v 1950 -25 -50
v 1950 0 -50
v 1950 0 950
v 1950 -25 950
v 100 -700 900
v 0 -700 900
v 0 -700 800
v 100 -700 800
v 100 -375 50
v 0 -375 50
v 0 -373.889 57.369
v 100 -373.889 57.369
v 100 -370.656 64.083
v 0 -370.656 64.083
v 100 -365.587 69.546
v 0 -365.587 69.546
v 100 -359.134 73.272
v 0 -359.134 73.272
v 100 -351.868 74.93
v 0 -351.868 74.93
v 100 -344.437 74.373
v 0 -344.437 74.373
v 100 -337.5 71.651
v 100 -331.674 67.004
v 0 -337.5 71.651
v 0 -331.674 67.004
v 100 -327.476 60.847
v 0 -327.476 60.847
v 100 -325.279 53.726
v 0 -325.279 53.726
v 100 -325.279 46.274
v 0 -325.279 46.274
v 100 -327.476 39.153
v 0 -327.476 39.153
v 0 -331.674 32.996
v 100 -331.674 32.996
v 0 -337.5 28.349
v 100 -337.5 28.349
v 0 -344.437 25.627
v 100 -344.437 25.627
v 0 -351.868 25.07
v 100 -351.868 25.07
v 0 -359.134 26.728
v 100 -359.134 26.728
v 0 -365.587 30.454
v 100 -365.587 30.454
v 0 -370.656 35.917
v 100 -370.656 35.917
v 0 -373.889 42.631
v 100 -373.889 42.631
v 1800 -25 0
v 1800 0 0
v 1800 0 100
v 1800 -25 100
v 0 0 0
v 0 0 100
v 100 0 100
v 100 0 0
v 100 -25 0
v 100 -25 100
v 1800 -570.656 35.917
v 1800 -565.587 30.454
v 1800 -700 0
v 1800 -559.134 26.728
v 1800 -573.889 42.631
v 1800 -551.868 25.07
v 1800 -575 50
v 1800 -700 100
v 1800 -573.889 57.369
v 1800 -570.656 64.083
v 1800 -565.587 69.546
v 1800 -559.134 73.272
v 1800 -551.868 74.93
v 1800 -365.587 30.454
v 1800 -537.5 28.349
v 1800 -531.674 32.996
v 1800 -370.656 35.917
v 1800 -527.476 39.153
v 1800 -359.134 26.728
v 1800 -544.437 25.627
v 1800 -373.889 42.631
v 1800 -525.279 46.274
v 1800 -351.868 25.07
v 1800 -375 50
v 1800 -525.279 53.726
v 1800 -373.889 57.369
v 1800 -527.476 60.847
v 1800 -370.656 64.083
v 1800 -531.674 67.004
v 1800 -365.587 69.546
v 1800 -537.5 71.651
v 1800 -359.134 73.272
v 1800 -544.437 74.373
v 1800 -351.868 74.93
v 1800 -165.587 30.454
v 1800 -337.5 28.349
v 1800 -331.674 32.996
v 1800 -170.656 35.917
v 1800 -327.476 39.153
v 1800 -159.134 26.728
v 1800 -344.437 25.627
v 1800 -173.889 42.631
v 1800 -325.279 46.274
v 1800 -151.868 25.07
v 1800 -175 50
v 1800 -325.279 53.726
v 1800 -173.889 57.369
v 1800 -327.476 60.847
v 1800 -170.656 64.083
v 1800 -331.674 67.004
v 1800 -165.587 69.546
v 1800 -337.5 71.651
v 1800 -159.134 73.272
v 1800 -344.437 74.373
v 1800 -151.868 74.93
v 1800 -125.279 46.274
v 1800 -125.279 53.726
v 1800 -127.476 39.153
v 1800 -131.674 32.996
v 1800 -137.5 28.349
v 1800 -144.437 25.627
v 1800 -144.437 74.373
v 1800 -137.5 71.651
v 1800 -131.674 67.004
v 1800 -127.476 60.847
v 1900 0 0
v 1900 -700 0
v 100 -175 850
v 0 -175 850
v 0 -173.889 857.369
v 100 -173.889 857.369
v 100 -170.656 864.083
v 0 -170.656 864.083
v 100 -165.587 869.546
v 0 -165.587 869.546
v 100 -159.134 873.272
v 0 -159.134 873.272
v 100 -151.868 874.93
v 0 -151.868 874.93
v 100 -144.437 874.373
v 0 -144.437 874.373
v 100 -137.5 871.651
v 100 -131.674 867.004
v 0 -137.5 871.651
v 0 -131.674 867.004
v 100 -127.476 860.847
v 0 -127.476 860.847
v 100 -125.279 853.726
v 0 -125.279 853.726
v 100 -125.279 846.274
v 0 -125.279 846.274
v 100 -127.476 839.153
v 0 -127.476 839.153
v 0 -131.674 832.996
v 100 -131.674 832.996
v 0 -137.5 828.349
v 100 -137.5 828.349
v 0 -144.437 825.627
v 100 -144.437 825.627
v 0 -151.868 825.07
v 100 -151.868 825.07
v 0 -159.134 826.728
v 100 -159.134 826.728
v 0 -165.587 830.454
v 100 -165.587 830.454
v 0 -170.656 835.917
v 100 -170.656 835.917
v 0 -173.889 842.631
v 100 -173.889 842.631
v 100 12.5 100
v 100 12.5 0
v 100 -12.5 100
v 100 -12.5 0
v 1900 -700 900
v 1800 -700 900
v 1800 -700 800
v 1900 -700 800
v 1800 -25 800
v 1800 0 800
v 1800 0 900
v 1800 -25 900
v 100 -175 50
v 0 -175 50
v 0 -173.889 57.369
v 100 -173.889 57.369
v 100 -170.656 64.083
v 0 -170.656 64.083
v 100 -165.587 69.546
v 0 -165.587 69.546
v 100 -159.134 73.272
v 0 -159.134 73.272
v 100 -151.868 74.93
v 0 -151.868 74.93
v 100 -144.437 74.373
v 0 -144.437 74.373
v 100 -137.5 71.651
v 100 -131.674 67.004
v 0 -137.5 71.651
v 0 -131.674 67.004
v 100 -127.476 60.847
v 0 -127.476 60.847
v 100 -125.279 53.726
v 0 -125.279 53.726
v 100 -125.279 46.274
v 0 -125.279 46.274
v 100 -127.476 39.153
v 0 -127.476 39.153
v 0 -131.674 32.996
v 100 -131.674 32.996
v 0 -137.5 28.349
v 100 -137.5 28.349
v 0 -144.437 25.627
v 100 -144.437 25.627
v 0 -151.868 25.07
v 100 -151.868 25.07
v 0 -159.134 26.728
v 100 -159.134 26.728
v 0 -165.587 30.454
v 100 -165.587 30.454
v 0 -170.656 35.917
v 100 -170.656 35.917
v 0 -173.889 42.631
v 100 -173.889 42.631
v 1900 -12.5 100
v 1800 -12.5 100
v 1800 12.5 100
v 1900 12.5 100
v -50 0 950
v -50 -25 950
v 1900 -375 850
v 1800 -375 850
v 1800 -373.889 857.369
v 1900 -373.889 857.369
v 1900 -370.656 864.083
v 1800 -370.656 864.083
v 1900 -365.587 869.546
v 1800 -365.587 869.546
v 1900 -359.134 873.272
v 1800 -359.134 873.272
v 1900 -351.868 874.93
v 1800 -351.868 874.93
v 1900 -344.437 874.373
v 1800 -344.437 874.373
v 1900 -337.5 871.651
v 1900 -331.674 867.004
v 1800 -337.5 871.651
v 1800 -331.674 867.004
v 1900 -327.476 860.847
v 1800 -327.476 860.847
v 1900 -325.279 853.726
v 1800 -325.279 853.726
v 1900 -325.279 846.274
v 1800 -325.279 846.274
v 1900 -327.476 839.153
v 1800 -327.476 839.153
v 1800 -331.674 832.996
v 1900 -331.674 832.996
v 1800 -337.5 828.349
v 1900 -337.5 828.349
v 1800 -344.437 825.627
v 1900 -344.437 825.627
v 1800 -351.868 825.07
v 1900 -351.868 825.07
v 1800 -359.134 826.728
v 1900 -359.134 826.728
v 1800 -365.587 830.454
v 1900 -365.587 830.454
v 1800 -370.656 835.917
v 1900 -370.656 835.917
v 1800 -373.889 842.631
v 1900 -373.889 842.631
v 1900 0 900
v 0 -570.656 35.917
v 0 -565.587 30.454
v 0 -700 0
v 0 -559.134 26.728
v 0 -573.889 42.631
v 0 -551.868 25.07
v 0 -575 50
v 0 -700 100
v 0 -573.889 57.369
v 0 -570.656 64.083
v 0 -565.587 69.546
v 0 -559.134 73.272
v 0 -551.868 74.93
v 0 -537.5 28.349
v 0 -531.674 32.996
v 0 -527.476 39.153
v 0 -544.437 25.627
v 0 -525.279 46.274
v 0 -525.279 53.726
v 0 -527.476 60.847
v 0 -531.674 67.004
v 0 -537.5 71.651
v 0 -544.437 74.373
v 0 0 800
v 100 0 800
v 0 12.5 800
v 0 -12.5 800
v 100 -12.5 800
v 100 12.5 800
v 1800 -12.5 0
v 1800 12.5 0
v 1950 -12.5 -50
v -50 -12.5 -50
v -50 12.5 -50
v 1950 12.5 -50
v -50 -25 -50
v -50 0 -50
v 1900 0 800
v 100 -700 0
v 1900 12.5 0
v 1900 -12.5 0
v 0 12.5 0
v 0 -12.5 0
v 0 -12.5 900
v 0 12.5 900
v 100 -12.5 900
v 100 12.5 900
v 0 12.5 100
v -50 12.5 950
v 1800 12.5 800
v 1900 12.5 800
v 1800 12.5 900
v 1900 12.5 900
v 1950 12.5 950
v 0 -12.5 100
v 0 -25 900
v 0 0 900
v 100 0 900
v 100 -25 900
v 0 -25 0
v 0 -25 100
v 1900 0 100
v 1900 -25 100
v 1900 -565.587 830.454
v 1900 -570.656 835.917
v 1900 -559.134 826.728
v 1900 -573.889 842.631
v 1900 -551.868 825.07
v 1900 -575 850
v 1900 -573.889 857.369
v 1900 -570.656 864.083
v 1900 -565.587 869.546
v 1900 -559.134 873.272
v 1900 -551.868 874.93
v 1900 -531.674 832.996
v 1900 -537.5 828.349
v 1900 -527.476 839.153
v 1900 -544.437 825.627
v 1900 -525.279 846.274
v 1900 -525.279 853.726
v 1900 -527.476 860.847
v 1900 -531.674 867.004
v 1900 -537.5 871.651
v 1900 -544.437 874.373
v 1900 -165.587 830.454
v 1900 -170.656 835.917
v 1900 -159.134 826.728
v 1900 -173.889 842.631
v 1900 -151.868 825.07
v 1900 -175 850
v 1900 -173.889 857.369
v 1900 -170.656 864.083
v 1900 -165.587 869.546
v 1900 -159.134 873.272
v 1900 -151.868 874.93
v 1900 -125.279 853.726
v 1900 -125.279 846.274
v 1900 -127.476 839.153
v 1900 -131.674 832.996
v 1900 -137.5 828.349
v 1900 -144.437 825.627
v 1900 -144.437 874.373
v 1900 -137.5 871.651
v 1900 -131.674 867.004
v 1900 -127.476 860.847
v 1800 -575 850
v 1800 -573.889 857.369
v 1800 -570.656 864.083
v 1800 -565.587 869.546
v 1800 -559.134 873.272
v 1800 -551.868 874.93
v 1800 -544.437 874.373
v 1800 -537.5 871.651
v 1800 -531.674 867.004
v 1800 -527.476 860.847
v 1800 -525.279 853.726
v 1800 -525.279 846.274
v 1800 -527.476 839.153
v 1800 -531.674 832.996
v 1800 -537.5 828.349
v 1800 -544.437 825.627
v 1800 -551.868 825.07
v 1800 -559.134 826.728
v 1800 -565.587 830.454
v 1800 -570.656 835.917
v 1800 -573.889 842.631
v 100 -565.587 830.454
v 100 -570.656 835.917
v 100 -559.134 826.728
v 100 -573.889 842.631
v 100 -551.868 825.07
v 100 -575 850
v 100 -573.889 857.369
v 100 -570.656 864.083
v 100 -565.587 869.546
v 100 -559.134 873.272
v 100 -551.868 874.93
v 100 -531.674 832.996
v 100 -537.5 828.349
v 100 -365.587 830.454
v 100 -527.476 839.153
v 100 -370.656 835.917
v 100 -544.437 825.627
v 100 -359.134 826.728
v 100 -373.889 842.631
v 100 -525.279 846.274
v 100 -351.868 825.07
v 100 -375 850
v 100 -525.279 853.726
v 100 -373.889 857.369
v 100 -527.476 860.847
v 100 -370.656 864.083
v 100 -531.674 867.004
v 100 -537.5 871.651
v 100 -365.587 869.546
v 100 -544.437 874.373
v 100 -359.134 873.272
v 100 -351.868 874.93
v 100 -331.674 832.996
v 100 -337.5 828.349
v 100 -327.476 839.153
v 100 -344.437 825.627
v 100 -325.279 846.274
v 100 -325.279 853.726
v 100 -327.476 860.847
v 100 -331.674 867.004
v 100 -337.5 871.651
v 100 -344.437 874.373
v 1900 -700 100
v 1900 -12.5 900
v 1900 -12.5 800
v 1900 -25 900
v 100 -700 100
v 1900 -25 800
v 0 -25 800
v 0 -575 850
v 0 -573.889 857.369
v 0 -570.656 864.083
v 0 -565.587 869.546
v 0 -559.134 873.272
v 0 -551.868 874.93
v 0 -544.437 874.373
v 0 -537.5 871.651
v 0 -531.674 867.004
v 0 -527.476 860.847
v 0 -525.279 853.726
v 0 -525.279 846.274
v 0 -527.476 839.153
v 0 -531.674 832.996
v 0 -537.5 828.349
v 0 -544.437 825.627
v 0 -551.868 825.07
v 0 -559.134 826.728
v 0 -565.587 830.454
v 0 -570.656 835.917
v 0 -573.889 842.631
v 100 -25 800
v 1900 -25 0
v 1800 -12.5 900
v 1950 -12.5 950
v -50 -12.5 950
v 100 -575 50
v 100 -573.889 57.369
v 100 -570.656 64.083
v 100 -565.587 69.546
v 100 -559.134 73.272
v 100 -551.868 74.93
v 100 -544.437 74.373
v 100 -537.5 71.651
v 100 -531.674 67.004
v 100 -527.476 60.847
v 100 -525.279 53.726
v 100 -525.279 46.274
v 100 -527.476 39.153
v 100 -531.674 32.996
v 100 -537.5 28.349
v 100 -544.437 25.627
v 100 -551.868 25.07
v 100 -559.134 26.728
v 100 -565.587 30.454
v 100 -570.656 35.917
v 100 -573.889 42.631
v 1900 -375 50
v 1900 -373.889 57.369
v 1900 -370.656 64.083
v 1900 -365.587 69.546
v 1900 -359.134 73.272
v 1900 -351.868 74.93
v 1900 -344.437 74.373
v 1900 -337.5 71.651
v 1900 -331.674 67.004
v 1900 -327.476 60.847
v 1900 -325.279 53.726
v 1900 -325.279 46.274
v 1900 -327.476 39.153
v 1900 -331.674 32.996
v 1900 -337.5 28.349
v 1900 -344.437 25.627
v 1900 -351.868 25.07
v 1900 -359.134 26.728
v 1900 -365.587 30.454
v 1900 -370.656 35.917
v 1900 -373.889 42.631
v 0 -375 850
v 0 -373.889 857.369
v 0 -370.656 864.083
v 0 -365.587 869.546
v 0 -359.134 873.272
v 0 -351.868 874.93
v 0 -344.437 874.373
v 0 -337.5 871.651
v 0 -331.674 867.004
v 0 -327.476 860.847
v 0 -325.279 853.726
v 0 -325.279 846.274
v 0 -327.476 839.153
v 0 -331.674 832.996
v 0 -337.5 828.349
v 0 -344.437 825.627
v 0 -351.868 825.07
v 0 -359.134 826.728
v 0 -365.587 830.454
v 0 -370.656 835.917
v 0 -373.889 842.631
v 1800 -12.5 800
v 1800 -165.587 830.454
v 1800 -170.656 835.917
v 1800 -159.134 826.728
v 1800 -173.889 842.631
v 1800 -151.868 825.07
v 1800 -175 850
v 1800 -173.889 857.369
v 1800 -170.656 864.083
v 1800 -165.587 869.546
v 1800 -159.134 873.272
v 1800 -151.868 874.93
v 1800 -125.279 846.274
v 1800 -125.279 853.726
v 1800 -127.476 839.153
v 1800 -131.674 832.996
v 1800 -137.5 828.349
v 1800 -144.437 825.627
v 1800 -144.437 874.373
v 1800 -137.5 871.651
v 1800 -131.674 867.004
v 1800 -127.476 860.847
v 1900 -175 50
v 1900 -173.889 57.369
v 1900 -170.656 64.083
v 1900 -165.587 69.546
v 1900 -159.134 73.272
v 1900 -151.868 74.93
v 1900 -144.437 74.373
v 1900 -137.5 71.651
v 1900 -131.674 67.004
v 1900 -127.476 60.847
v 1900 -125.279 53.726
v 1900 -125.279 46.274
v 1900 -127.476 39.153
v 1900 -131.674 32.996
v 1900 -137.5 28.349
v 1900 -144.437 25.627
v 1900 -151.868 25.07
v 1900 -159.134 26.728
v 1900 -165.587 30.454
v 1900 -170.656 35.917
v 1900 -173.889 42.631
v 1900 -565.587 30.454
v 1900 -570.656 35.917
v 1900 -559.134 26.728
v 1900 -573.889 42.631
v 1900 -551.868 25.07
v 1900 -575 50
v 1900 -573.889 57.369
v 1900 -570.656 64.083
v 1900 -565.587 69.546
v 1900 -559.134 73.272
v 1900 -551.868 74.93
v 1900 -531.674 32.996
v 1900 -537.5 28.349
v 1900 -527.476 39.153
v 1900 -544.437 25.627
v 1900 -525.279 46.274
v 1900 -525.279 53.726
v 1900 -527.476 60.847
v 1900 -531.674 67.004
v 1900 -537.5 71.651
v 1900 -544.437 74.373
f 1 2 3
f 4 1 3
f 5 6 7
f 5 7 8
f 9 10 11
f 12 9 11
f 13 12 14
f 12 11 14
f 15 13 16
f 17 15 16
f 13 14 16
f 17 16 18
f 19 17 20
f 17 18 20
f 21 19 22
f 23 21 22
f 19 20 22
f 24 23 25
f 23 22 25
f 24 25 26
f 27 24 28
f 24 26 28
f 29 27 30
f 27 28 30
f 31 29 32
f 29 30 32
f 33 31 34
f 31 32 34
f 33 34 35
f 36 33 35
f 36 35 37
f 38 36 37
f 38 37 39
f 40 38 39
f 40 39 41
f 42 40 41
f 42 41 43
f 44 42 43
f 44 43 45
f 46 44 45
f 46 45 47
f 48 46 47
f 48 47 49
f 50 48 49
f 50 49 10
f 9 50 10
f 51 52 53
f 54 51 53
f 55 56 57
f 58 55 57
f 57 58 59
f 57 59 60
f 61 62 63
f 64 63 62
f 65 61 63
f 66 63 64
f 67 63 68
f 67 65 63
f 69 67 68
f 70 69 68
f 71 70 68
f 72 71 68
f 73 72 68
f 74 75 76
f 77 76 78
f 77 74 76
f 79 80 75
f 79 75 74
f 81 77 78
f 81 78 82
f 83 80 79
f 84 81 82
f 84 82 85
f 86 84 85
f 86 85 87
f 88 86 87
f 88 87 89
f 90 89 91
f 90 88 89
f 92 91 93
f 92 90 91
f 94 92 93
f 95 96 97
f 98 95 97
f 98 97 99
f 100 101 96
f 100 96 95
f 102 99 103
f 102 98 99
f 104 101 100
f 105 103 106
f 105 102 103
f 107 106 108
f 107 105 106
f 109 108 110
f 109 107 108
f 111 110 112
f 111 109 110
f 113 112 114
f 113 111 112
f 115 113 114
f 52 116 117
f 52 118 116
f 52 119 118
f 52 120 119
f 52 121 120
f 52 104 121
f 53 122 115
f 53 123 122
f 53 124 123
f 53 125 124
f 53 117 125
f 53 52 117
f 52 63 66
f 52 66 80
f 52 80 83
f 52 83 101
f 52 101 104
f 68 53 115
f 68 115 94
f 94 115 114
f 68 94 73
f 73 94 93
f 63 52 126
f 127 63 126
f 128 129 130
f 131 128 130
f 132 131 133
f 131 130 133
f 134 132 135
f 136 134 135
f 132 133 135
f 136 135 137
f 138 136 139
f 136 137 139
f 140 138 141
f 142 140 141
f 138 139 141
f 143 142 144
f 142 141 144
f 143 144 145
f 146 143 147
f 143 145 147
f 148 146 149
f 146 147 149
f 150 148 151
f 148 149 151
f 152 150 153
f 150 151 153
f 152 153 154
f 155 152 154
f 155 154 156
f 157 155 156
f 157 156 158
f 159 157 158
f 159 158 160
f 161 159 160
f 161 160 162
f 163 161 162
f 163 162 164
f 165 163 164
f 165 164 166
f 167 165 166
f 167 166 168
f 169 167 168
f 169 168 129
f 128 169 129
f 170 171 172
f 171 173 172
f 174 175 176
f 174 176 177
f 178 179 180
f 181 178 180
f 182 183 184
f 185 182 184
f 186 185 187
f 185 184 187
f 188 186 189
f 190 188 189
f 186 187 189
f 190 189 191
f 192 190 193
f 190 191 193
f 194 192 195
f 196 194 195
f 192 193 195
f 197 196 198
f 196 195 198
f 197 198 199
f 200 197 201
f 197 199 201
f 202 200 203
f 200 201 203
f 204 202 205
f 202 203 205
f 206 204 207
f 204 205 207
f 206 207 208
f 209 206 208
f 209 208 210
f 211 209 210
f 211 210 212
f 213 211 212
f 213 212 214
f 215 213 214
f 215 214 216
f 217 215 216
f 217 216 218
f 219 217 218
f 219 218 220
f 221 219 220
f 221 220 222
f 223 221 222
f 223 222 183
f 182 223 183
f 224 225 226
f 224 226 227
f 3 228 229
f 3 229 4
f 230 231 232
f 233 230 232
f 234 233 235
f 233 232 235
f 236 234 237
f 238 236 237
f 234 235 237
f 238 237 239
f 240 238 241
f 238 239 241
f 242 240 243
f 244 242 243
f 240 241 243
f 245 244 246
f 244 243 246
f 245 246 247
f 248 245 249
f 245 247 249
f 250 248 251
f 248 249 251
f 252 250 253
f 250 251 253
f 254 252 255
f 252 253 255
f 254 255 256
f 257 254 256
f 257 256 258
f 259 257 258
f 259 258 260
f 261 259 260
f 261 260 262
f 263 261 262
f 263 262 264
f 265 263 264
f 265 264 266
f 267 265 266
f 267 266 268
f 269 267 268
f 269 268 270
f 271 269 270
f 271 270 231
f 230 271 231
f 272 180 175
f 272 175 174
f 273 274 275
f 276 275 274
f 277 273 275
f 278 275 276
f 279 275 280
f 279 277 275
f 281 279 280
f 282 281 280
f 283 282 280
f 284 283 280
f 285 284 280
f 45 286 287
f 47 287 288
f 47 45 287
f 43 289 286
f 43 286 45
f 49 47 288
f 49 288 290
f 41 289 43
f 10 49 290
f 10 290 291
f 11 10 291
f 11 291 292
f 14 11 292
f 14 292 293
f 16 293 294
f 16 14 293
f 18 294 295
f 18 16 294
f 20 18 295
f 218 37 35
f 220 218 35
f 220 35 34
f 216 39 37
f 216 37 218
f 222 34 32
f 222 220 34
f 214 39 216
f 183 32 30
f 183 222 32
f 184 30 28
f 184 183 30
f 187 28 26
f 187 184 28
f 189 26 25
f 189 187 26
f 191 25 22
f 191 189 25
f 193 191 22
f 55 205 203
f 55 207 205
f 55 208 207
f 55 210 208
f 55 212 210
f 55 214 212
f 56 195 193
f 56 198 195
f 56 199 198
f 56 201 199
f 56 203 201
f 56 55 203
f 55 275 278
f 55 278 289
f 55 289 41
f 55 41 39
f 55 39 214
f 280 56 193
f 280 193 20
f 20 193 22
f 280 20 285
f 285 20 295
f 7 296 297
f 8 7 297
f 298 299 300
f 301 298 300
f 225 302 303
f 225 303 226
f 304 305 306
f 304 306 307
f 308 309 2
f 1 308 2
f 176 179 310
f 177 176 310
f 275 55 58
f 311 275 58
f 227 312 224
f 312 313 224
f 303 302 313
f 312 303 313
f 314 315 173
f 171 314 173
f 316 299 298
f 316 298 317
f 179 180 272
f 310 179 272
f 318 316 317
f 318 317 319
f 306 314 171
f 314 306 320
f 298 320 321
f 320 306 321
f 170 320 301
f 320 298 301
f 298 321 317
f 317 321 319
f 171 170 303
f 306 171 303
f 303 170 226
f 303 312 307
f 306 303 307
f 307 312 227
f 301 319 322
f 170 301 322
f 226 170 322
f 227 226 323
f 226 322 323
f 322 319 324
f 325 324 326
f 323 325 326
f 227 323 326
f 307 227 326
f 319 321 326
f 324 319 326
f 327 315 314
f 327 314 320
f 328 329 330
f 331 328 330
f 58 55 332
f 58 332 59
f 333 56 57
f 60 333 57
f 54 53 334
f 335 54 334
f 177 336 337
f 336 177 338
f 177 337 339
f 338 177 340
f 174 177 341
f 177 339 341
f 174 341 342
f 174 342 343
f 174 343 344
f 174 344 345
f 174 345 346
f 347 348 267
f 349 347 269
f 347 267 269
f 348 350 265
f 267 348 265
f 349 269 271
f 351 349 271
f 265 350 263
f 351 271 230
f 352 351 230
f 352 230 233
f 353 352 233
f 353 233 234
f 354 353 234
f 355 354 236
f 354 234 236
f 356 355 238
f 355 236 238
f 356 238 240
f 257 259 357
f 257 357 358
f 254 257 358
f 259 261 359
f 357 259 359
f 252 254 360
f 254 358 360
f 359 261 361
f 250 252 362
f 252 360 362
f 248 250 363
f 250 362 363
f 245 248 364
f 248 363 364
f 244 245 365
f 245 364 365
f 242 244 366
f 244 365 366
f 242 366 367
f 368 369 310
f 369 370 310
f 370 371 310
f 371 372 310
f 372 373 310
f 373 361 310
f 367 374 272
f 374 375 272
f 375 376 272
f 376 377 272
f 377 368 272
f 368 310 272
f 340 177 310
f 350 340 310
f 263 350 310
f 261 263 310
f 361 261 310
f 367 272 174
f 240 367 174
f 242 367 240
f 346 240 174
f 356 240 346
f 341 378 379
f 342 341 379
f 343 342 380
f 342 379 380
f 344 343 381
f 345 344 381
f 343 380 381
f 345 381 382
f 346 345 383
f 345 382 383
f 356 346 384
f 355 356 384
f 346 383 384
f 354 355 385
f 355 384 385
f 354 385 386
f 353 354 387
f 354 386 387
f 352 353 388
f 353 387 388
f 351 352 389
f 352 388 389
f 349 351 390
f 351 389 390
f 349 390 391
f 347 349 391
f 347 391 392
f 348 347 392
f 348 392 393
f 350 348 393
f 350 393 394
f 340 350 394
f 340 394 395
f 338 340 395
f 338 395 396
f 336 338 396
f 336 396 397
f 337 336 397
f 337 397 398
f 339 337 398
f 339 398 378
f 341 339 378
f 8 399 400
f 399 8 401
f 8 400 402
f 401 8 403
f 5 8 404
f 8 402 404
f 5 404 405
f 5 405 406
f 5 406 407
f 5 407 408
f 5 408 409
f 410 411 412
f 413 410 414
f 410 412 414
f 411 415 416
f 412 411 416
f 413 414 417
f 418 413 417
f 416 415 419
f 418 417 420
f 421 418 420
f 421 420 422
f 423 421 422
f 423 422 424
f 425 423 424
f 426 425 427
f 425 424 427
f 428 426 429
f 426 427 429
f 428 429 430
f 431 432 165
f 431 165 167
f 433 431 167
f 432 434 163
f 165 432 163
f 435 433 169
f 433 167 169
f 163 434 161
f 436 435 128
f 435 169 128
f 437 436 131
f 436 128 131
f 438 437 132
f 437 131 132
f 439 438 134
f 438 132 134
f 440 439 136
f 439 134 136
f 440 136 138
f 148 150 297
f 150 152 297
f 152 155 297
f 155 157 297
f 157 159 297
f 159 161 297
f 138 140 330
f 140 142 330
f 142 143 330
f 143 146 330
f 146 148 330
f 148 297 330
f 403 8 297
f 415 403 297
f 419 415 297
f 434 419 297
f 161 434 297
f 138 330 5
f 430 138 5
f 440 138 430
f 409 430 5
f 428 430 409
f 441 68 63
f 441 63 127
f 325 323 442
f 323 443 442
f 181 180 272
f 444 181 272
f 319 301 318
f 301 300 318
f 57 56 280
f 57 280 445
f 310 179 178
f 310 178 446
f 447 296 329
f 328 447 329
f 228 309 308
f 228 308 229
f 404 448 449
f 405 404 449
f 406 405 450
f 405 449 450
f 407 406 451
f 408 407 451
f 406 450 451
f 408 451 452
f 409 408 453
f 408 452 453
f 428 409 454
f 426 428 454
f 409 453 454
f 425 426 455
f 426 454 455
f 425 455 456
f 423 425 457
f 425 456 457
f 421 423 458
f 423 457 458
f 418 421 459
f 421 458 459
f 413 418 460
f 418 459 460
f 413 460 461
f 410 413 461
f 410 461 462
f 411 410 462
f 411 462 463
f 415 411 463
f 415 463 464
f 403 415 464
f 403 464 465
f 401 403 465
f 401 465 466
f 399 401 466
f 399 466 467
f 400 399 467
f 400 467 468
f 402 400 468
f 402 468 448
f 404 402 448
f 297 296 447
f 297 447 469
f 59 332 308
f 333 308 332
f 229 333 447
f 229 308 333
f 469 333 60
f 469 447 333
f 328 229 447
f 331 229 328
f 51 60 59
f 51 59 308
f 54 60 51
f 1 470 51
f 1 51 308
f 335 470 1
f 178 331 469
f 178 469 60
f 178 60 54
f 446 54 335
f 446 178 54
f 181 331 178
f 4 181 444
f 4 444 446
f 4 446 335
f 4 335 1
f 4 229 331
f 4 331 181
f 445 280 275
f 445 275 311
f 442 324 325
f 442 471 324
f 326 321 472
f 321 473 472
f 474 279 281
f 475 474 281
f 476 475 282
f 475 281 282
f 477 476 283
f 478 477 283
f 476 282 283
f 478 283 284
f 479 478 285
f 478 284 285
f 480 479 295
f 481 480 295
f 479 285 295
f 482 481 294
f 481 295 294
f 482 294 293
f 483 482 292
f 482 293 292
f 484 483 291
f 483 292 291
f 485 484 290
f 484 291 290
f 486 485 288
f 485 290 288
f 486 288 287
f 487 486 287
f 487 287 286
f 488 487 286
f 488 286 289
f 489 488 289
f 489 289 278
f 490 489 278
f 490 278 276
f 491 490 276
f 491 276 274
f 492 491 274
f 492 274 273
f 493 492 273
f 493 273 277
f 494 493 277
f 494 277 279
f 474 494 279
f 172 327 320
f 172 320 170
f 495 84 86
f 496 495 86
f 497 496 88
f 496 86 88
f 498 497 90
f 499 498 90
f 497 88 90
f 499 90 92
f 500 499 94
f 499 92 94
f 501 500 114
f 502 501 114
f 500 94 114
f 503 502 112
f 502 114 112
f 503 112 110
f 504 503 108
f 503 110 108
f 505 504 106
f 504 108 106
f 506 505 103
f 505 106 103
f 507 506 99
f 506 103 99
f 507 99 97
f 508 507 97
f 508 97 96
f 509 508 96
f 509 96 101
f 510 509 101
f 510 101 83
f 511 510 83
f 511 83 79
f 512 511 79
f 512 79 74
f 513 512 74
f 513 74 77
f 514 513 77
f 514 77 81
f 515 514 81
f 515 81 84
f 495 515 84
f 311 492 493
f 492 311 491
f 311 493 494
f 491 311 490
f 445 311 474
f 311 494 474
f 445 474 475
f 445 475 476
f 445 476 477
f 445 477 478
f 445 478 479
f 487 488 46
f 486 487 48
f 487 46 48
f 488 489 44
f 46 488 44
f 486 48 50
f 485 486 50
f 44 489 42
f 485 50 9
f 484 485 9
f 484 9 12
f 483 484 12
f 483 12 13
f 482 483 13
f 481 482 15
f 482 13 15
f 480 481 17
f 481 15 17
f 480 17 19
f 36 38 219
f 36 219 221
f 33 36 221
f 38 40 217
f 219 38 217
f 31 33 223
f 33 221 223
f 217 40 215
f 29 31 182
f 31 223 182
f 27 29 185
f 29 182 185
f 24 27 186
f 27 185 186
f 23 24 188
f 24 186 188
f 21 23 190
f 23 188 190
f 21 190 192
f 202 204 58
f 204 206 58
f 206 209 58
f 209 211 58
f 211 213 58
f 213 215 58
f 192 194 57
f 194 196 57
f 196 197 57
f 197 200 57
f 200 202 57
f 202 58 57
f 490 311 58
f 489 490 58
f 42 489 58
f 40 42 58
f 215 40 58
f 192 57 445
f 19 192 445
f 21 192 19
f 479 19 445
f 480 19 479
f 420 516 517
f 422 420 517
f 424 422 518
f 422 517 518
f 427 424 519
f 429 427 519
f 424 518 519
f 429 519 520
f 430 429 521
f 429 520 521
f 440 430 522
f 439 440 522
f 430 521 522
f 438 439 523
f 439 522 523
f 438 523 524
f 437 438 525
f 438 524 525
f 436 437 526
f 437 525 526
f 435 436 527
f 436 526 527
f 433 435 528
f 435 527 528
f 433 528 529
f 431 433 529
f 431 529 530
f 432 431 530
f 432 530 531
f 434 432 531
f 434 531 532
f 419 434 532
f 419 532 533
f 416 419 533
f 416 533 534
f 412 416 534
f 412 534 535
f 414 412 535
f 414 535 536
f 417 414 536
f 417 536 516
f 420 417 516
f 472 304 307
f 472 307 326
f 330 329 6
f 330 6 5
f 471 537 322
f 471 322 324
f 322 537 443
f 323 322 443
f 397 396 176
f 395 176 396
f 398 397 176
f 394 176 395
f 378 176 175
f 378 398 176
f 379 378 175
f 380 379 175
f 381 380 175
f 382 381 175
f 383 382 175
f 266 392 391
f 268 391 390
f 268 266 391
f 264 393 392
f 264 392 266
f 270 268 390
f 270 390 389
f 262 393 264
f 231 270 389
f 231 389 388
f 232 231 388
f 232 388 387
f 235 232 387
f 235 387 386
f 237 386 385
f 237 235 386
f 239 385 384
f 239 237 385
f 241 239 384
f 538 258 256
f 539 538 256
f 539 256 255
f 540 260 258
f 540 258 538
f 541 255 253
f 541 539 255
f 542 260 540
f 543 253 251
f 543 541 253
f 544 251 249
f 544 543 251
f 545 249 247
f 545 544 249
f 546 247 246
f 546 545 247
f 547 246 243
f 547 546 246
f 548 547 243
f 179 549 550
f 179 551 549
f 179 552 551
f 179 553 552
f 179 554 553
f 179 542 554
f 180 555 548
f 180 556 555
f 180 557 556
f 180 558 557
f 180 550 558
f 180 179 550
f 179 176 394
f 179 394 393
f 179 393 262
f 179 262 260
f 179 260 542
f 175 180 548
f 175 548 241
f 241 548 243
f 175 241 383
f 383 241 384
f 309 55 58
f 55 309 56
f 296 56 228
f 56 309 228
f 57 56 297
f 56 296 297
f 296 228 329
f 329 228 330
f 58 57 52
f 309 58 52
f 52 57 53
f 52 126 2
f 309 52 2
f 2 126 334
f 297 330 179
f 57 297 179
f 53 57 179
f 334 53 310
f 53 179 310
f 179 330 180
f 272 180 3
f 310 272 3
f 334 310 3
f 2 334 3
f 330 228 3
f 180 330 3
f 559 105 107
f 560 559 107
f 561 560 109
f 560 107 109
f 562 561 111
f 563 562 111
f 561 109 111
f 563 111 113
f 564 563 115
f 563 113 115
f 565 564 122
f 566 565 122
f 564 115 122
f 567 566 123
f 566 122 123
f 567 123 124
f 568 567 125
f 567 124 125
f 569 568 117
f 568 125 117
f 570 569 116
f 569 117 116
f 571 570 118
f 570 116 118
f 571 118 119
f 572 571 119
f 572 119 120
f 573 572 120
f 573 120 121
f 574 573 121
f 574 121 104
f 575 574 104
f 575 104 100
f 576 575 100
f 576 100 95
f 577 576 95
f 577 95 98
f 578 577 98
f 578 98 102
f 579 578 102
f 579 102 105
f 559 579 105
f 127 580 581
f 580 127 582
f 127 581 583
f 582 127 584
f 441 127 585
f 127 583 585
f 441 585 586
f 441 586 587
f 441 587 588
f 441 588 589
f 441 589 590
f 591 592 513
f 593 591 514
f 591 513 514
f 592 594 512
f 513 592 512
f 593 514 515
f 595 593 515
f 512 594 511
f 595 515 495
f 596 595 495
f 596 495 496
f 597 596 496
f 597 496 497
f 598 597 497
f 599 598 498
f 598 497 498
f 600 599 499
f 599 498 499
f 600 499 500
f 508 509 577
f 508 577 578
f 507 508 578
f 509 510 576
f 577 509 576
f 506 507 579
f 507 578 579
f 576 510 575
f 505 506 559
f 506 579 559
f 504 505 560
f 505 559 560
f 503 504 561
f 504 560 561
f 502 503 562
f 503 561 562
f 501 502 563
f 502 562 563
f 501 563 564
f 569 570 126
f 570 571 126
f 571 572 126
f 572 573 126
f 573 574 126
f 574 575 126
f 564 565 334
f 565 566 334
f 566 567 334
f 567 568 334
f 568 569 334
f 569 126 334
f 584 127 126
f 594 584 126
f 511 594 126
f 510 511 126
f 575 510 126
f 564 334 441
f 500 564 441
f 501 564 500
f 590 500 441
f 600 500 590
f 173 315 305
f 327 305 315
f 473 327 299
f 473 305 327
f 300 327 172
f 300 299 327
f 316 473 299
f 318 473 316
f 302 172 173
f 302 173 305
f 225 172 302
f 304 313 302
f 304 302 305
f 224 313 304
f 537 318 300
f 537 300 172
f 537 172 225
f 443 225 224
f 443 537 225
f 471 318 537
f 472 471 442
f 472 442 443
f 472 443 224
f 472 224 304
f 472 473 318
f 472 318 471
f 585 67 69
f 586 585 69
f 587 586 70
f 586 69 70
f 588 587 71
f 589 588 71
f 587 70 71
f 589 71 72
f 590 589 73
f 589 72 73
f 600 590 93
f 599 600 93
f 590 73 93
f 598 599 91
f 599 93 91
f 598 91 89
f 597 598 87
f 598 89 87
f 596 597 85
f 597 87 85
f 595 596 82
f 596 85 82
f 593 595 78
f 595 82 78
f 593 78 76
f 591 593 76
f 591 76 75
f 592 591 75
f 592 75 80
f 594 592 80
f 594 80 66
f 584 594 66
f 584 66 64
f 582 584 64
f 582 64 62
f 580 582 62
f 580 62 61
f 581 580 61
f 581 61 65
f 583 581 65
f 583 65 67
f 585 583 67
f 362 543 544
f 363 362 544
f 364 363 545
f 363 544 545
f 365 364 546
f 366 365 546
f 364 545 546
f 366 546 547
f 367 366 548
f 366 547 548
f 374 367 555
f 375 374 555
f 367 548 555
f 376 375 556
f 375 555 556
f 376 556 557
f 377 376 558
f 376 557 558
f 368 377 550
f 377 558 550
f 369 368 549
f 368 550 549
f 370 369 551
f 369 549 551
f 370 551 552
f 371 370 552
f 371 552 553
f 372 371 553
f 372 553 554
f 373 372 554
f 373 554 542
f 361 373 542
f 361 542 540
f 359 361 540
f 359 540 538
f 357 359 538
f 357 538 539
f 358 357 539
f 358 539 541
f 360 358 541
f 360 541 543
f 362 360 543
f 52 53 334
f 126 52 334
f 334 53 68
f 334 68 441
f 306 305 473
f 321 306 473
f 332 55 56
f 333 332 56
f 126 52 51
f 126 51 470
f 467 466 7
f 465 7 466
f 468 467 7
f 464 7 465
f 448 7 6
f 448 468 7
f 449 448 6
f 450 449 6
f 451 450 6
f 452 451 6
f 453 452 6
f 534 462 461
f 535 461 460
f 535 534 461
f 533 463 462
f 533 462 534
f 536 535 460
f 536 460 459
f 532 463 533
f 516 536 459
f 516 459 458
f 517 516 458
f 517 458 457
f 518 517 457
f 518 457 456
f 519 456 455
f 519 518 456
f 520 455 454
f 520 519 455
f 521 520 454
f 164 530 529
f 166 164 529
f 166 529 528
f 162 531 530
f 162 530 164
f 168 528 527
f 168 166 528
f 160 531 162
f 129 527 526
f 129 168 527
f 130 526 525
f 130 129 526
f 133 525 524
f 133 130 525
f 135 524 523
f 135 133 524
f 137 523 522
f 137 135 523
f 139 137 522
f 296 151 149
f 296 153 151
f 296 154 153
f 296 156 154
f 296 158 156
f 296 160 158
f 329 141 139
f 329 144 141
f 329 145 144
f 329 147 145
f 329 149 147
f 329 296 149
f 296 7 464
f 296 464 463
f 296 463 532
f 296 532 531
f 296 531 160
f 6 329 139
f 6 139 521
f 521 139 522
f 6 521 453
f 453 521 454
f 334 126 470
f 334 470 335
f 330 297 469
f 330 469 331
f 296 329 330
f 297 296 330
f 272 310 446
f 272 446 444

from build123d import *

# Parameters (mm, degrees)
F0_W     = 2000
F0_H     = 1000
F0_W_2   = 100
F0_H_2   = 100
F1_DEPTH = 12.5
F2_DEPTH = 700
F3_DEPTH = 25
F4_R     = 25
F5_DEPTH = 1950.001


with BuildPart() as f1:
    # F0 (on Front) → F1 (new body, symmetric)
    with BuildSketch(Plane.XZ):
        with Locations((950, 450)):
            Rectangle(F0_W, F0_H)
        with Locations((50, 50)):
            Rectangle(F0_W_2, F0_H_2, mode=Mode.SUBTRACT)
        with Locations((1850, 50)):
            Rectangle(F0_W_2, F0_H_2, mode=Mode.SUBTRACT)
        with Locations((50, 850)):
            Rectangle(F0_W_2, F0_H_2, mode=Mode.SUBTRACT)
        with Locations((1850, 850)):
            Rectangle(F0_W_2, F0_H_2, mode=Mode.SUBTRACT)
    extrude(amount=F1_DEPTH, both=True)


with BuildPart() as f2:
    # F0 (on Front) → F2 (new body)
    with BuildSketch(Plane.XZ):
        with Locations((50, 850)):
            Rectangle(F0_W_2, F0_H_2)
        with Locations((1850, 850)):
            Rectangle(F0_W_2, F0_H_2)
        with Locations((1850, 50)):
            Rectangle(F0_W_2, F0_H_2)
        with Locations((50, 50)):
            Rectangle(F0_W_2, F0_H_2)
    extrude(amount=F2_DEPTH)

    # F4 (on face) → F5 (cut, through all)
    with BuildSketch(Plane(origin=(0, 0, 0), x_dir=(0, -1, 0), z_dir=(-1, 0, 0))):
        with Locations((150, 850)):
            Circle(F4_R)
        with Locations((350, 50)):
            Circle(F4_R)
        with Locations((550, 50)):
            Circle(F4_R)
        with Locations((350, 850)):
            Circle(F4_R)
        with Locations((550, 850)):
            Circle(F4_R)
        with Locations((150, 50)):
            Circle(F4_R)
    extrude(amount=-F5_DEPTH, mode=Mode.SUBTRACT)


with BuildPart() as f3:
    # F0 (on Front) → F3 (new body)
    with BuildSketch(Plane.XZ):
        with Locations((950, 450)):
            Rectangle(F0_W, F0_H)
        with Locations((50, 50)):
            Rectangle(F0_W_2, F0_H_2, mode=Mode.SUBTRACT)
        with Locations((1850, 50)):
            Rectangle(F0_W_2, F0_H_2, mode=Mode.SUBTRACT)
        with Locations((50, 850)):
            Rectangle(F0_W_2, F0_H_2, mode=Mode.SUBTRACT)
        with Locations((1850, 850)):
            Rectangle(F0_W_2, F0_H_2, mode=Mode.SUBTRACT)
    extrude(amount=F3_DEPTH)


solid = Compound([f1.part, f2.part, f3.part])
